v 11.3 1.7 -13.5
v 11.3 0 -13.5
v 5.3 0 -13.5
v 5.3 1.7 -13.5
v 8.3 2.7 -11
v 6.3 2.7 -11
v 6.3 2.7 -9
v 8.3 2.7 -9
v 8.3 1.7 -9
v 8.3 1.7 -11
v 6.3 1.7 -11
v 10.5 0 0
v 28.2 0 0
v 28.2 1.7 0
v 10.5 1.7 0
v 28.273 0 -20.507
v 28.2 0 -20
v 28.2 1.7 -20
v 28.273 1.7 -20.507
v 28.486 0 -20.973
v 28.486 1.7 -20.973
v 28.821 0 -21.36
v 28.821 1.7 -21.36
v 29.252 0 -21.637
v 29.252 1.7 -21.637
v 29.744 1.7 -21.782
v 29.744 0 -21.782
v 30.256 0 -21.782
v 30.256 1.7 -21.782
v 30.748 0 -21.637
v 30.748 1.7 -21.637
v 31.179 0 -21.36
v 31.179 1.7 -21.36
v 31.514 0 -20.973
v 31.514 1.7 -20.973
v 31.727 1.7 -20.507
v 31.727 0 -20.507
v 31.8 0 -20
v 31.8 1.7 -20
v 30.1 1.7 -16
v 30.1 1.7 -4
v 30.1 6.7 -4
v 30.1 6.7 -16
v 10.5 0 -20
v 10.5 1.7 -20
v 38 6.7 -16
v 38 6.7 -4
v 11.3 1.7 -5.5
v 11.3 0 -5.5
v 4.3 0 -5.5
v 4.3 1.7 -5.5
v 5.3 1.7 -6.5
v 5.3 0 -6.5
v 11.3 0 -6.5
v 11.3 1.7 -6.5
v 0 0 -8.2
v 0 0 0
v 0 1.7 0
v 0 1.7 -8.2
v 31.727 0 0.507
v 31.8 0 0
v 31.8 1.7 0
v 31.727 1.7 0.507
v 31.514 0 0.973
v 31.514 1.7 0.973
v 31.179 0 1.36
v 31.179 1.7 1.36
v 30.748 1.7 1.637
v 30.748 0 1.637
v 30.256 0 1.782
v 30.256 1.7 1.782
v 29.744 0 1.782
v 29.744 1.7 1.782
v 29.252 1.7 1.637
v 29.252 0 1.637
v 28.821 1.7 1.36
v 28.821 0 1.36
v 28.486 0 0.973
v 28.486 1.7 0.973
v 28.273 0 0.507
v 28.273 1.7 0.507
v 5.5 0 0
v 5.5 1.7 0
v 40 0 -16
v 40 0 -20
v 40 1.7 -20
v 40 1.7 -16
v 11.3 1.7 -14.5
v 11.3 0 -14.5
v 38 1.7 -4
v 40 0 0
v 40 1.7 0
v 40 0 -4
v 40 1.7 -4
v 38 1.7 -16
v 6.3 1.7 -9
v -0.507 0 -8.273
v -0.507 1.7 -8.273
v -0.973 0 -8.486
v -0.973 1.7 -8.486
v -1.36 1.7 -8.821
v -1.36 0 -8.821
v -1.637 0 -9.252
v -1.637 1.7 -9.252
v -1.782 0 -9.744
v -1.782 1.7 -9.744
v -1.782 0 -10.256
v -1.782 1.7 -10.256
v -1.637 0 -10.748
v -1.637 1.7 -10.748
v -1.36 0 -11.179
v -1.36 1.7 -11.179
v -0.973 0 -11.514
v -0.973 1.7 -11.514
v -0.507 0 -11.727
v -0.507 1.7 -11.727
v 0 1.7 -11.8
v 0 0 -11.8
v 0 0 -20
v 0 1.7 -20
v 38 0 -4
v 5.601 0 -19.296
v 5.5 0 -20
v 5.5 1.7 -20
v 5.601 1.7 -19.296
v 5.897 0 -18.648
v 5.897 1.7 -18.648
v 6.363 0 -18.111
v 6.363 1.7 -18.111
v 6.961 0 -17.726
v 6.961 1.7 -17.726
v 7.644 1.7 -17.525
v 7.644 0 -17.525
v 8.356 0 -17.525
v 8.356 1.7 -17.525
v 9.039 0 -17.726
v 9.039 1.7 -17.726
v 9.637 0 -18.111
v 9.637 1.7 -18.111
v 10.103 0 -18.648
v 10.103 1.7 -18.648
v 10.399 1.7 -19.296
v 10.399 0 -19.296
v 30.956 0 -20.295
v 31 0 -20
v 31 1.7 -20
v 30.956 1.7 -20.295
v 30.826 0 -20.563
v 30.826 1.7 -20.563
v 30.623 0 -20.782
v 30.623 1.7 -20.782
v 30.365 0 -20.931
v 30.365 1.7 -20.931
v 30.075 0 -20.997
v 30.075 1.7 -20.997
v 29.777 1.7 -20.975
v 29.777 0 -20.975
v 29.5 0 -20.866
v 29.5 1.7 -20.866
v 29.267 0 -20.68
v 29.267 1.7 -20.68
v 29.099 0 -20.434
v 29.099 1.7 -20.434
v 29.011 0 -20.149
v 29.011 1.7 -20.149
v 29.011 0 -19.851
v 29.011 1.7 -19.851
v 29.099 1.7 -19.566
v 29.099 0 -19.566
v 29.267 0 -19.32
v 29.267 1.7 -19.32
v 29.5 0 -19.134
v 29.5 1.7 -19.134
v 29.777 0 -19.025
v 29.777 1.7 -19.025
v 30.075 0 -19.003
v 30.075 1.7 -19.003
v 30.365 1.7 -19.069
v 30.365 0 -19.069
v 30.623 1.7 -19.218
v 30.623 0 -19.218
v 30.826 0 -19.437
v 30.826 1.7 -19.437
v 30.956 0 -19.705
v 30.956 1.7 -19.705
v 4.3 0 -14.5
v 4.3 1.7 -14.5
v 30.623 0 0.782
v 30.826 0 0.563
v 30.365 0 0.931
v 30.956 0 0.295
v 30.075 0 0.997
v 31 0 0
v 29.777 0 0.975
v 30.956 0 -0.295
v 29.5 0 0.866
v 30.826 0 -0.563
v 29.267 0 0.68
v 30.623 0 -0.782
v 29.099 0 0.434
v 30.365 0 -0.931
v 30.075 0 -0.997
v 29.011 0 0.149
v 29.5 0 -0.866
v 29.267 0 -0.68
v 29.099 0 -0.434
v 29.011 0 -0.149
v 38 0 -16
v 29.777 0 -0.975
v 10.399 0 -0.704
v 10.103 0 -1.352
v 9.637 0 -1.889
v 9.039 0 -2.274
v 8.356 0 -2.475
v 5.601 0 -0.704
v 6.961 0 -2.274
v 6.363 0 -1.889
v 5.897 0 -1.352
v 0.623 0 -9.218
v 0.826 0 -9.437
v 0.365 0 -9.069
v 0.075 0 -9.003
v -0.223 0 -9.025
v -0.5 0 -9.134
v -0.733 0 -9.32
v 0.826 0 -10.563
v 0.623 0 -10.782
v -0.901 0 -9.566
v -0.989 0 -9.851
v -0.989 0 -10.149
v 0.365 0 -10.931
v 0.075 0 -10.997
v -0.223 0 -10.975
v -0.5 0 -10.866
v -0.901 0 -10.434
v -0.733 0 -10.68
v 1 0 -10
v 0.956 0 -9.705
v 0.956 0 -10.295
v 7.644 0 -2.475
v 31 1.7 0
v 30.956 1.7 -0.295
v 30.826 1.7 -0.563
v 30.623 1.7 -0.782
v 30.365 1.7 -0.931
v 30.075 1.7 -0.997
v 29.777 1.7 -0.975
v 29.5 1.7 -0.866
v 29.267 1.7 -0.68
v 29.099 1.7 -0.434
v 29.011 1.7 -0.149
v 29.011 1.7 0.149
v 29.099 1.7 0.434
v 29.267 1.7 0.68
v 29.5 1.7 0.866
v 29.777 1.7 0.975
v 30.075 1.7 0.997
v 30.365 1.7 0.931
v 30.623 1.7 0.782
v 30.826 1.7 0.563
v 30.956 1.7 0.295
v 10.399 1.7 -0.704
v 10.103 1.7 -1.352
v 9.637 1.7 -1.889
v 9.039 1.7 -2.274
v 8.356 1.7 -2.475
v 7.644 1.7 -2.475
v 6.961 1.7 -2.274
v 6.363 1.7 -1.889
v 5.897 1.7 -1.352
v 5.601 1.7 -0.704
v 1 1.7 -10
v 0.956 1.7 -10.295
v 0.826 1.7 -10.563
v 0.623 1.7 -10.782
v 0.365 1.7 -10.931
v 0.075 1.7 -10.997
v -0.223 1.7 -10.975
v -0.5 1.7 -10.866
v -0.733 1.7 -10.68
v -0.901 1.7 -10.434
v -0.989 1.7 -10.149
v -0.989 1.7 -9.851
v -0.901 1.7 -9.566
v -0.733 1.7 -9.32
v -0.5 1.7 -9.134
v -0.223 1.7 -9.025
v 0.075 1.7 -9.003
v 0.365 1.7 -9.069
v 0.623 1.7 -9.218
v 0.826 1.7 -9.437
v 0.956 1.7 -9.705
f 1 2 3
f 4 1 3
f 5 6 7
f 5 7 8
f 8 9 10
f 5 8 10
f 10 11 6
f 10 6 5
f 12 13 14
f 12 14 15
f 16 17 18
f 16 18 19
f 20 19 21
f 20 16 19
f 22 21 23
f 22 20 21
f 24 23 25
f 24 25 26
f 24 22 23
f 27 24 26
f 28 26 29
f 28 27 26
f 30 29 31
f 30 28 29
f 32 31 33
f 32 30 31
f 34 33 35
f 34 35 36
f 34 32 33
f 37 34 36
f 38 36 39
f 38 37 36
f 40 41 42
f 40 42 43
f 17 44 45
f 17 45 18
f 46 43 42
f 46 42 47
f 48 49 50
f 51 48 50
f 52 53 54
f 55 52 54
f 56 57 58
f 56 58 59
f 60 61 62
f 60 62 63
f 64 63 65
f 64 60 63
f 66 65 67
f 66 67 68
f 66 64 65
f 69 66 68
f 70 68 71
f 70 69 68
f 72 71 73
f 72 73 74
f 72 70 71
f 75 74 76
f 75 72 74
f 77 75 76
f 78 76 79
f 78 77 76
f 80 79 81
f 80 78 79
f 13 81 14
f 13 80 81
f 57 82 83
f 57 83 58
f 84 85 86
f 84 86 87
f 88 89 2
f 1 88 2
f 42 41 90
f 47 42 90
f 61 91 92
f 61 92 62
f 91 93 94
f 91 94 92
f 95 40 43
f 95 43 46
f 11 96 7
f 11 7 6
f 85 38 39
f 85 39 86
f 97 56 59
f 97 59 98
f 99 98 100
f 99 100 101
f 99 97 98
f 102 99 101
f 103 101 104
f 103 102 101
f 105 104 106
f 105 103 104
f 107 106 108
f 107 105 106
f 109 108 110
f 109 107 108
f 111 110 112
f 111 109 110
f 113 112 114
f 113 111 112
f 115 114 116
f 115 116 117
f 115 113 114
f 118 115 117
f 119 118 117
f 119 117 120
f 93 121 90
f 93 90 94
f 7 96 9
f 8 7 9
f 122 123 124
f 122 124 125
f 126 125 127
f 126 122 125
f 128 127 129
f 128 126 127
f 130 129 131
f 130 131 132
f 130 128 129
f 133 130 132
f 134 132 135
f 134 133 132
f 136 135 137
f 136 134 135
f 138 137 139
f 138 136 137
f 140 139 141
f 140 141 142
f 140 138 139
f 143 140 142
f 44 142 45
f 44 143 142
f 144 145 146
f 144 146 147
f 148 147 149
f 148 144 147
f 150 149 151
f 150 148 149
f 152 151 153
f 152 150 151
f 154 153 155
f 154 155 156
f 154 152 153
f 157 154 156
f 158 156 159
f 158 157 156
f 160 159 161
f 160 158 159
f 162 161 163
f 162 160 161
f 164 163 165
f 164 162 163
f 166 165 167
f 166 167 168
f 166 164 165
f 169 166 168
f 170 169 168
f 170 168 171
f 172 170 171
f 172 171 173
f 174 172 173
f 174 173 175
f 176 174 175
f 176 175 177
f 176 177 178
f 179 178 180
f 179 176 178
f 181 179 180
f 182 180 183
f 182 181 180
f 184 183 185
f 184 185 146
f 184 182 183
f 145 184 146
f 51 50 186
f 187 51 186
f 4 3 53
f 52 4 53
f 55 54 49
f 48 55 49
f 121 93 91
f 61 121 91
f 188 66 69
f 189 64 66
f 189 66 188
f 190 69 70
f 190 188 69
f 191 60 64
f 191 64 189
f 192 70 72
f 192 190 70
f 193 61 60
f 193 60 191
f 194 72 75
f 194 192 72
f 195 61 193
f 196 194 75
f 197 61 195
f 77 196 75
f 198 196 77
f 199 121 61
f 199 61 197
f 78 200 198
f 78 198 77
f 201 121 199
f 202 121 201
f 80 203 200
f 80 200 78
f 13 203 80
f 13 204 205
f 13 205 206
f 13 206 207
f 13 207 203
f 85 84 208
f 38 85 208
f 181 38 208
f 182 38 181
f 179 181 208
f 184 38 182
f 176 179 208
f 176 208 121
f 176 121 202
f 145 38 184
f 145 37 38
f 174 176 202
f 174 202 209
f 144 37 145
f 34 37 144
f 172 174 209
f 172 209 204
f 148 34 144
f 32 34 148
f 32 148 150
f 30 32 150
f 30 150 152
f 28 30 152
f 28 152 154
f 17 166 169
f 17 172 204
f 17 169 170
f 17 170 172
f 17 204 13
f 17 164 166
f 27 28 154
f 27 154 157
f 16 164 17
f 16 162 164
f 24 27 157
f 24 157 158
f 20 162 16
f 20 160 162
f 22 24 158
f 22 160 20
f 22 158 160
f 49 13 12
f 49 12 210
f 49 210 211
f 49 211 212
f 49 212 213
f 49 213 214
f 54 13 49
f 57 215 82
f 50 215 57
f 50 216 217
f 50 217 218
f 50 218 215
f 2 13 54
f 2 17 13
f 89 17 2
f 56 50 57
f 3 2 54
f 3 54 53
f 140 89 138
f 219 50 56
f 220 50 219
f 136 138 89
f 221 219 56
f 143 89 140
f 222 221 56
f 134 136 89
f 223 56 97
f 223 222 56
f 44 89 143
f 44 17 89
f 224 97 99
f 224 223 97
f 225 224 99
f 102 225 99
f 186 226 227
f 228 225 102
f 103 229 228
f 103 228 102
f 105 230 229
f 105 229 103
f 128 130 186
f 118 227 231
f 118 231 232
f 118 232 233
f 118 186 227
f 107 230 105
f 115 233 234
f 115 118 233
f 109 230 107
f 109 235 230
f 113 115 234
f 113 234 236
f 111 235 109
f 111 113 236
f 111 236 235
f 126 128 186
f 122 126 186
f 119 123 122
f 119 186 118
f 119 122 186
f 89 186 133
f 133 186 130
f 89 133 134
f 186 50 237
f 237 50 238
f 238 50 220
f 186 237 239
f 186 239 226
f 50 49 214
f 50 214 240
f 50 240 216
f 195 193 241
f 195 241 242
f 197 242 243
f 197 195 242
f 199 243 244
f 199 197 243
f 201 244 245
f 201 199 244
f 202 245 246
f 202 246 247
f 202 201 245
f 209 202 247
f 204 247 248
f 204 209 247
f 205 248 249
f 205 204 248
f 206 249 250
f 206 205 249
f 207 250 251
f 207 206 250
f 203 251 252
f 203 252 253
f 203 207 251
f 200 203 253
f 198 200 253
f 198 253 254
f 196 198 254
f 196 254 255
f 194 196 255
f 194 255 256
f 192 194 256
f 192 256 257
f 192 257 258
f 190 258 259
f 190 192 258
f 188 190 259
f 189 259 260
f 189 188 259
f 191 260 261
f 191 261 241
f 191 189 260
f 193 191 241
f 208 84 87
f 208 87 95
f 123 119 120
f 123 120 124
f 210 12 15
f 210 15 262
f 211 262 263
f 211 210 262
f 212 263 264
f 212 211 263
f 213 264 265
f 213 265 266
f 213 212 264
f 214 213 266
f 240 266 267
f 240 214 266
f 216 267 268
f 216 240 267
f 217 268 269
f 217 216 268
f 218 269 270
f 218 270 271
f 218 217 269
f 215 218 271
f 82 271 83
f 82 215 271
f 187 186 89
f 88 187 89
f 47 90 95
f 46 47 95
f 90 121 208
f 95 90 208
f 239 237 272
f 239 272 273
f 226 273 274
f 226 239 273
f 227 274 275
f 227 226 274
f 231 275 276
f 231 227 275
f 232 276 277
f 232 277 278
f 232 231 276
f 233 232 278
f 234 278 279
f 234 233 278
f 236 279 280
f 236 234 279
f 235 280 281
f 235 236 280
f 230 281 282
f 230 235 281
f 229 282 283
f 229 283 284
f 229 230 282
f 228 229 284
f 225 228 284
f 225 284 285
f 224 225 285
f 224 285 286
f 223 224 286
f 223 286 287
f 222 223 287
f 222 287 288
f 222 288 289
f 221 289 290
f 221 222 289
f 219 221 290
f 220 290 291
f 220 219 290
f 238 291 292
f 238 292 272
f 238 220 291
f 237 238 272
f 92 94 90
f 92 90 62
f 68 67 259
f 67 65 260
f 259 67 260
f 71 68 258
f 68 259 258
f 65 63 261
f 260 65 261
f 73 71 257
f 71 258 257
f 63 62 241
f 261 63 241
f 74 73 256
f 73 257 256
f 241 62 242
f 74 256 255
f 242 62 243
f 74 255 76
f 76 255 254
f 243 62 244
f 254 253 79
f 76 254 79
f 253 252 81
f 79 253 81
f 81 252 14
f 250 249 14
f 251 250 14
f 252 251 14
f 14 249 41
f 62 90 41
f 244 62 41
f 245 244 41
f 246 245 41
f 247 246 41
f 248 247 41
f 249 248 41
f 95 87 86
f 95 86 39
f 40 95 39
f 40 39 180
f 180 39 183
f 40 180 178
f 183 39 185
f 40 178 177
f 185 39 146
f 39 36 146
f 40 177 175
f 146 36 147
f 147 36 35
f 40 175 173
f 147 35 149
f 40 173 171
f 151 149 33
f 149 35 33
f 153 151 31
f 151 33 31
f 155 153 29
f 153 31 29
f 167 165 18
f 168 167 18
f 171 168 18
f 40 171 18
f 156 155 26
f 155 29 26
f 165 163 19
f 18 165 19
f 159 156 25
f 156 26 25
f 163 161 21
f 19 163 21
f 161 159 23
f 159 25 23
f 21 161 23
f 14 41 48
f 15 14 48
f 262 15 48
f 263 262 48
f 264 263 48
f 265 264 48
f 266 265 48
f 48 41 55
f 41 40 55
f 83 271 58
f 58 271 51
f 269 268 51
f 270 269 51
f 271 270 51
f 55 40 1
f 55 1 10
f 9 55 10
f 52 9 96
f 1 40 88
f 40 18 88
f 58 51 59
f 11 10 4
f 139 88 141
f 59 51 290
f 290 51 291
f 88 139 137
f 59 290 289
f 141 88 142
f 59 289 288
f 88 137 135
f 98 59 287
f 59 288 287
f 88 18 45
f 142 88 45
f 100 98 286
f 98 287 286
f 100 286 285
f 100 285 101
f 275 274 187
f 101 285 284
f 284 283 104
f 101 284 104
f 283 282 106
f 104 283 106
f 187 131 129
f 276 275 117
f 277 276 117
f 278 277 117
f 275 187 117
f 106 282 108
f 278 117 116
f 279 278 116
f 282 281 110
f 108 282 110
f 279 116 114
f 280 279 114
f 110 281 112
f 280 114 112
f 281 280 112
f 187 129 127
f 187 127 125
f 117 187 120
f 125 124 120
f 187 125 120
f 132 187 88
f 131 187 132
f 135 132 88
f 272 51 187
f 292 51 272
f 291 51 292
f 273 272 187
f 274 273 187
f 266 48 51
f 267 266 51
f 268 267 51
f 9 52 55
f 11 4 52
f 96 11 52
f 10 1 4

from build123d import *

# Parameters (mm, degrees)
SKETCH1_R           = 1
BOSS_EXTRUDE1_DEPTH = 1.7
SKETCH2_W           = 2
SKETCH2_H           = 2
BOSS_EXTRUDE2_DEPTH = 1
SKETCH3_W           = 7.9
SKETCH3_H           = 12
BOSS_EXTRUDE3_DEPTH = 5


with BuildPart() as part:
    # Sketch1 → Boss-Extrude1 (new body)
    with BuildSketch(Plane(origin=(0, 0, 0), x_dir=(1, 0, 0), z_dir=(0, 1, 0))):
        with BuildLine():
            Line((0, 0), (0, 8.2))
            ThreePointArc((0, 8.2), (-1.8, 10), (0, 11.8))
            Line((0, 11.8), (0, 20))
            Line((0, 20), (5.5, 20))
            ThreePointArc((5.5, 20), (8, 17.5), (10.5, 20))
            Line((10.5, 20), (28.2, 20))
            ThreePointArc((28.2, 20), (30, 21.8), (31.8, 20))
            Line((31.8, 20), (40, 20))
            Line((40, 20), (40, 16))
            Line((40, 16), (38, 16))
            Line((38, 16), (38, 4))
            Line((38, 4), (40, 4))
            Line((40, 4), (40, 0))
            Line((40, 0), (31.8, 0))
            ThreePointArc((31.8, 0), (30, -1.8), (28.2, 0))
            Line((28.2, 0), (10.5, 0))
            ThreePointArc((10.5, 0), (8, 2.5), (5.5, 0))
            Line((5.5, 0), (0, 0))
        make_face()
        with Locations((0, 10)):
            Circle(SKETCH1_R, mode=Mode.SUBTRACT)
        with Locations((30, 0)):
            Circle(SKETCH1_R, mode=Mode.SUBTRACT)
        with Locations((30, 20)):
            Circle(SKETCH1_R, mode=Mode.SUBTRACT)
        Polygon((4.3, 14.5), (11.3, 14.5), (11.3, 13.5), (5.3, 13.5), (5.3, 6.5), (11.3, 6.5), (11.3, 5.5), (4.3, 5.5), align=None, mode=Mode.SUBTRACT)
    extrude(amount=BOSS_EXTRUDE1_DEPTH)

    # Sketch2 → Boss-Extrude2 (add)
    with BuildSketch(Plane(origin=(0, 1.7, 0), x_dir=(1, 0, 0), z_dir=(0, 1, 0))):
        with Locations((7.3, 10)):
            Rectangle(SKETCH2_W, SKETCH2_H)
    extrude(amount=BOSS_EXTRUDE2_DEPTH)

    # Sketch3 → Boss-Extrude3 (add)
    with BuildSketch(Plane(origin=(0, 1.7, 0), x_dir=(1, 0, 0), z_dir=(0, 1, 0))):
        with Locations((34.05, 10)):
            Rectangle(SKETCH3_W, SKETCH3_H)
    extrude(amount=BOSS_EXTRUDE3_DEPTH)


solid = part.part
